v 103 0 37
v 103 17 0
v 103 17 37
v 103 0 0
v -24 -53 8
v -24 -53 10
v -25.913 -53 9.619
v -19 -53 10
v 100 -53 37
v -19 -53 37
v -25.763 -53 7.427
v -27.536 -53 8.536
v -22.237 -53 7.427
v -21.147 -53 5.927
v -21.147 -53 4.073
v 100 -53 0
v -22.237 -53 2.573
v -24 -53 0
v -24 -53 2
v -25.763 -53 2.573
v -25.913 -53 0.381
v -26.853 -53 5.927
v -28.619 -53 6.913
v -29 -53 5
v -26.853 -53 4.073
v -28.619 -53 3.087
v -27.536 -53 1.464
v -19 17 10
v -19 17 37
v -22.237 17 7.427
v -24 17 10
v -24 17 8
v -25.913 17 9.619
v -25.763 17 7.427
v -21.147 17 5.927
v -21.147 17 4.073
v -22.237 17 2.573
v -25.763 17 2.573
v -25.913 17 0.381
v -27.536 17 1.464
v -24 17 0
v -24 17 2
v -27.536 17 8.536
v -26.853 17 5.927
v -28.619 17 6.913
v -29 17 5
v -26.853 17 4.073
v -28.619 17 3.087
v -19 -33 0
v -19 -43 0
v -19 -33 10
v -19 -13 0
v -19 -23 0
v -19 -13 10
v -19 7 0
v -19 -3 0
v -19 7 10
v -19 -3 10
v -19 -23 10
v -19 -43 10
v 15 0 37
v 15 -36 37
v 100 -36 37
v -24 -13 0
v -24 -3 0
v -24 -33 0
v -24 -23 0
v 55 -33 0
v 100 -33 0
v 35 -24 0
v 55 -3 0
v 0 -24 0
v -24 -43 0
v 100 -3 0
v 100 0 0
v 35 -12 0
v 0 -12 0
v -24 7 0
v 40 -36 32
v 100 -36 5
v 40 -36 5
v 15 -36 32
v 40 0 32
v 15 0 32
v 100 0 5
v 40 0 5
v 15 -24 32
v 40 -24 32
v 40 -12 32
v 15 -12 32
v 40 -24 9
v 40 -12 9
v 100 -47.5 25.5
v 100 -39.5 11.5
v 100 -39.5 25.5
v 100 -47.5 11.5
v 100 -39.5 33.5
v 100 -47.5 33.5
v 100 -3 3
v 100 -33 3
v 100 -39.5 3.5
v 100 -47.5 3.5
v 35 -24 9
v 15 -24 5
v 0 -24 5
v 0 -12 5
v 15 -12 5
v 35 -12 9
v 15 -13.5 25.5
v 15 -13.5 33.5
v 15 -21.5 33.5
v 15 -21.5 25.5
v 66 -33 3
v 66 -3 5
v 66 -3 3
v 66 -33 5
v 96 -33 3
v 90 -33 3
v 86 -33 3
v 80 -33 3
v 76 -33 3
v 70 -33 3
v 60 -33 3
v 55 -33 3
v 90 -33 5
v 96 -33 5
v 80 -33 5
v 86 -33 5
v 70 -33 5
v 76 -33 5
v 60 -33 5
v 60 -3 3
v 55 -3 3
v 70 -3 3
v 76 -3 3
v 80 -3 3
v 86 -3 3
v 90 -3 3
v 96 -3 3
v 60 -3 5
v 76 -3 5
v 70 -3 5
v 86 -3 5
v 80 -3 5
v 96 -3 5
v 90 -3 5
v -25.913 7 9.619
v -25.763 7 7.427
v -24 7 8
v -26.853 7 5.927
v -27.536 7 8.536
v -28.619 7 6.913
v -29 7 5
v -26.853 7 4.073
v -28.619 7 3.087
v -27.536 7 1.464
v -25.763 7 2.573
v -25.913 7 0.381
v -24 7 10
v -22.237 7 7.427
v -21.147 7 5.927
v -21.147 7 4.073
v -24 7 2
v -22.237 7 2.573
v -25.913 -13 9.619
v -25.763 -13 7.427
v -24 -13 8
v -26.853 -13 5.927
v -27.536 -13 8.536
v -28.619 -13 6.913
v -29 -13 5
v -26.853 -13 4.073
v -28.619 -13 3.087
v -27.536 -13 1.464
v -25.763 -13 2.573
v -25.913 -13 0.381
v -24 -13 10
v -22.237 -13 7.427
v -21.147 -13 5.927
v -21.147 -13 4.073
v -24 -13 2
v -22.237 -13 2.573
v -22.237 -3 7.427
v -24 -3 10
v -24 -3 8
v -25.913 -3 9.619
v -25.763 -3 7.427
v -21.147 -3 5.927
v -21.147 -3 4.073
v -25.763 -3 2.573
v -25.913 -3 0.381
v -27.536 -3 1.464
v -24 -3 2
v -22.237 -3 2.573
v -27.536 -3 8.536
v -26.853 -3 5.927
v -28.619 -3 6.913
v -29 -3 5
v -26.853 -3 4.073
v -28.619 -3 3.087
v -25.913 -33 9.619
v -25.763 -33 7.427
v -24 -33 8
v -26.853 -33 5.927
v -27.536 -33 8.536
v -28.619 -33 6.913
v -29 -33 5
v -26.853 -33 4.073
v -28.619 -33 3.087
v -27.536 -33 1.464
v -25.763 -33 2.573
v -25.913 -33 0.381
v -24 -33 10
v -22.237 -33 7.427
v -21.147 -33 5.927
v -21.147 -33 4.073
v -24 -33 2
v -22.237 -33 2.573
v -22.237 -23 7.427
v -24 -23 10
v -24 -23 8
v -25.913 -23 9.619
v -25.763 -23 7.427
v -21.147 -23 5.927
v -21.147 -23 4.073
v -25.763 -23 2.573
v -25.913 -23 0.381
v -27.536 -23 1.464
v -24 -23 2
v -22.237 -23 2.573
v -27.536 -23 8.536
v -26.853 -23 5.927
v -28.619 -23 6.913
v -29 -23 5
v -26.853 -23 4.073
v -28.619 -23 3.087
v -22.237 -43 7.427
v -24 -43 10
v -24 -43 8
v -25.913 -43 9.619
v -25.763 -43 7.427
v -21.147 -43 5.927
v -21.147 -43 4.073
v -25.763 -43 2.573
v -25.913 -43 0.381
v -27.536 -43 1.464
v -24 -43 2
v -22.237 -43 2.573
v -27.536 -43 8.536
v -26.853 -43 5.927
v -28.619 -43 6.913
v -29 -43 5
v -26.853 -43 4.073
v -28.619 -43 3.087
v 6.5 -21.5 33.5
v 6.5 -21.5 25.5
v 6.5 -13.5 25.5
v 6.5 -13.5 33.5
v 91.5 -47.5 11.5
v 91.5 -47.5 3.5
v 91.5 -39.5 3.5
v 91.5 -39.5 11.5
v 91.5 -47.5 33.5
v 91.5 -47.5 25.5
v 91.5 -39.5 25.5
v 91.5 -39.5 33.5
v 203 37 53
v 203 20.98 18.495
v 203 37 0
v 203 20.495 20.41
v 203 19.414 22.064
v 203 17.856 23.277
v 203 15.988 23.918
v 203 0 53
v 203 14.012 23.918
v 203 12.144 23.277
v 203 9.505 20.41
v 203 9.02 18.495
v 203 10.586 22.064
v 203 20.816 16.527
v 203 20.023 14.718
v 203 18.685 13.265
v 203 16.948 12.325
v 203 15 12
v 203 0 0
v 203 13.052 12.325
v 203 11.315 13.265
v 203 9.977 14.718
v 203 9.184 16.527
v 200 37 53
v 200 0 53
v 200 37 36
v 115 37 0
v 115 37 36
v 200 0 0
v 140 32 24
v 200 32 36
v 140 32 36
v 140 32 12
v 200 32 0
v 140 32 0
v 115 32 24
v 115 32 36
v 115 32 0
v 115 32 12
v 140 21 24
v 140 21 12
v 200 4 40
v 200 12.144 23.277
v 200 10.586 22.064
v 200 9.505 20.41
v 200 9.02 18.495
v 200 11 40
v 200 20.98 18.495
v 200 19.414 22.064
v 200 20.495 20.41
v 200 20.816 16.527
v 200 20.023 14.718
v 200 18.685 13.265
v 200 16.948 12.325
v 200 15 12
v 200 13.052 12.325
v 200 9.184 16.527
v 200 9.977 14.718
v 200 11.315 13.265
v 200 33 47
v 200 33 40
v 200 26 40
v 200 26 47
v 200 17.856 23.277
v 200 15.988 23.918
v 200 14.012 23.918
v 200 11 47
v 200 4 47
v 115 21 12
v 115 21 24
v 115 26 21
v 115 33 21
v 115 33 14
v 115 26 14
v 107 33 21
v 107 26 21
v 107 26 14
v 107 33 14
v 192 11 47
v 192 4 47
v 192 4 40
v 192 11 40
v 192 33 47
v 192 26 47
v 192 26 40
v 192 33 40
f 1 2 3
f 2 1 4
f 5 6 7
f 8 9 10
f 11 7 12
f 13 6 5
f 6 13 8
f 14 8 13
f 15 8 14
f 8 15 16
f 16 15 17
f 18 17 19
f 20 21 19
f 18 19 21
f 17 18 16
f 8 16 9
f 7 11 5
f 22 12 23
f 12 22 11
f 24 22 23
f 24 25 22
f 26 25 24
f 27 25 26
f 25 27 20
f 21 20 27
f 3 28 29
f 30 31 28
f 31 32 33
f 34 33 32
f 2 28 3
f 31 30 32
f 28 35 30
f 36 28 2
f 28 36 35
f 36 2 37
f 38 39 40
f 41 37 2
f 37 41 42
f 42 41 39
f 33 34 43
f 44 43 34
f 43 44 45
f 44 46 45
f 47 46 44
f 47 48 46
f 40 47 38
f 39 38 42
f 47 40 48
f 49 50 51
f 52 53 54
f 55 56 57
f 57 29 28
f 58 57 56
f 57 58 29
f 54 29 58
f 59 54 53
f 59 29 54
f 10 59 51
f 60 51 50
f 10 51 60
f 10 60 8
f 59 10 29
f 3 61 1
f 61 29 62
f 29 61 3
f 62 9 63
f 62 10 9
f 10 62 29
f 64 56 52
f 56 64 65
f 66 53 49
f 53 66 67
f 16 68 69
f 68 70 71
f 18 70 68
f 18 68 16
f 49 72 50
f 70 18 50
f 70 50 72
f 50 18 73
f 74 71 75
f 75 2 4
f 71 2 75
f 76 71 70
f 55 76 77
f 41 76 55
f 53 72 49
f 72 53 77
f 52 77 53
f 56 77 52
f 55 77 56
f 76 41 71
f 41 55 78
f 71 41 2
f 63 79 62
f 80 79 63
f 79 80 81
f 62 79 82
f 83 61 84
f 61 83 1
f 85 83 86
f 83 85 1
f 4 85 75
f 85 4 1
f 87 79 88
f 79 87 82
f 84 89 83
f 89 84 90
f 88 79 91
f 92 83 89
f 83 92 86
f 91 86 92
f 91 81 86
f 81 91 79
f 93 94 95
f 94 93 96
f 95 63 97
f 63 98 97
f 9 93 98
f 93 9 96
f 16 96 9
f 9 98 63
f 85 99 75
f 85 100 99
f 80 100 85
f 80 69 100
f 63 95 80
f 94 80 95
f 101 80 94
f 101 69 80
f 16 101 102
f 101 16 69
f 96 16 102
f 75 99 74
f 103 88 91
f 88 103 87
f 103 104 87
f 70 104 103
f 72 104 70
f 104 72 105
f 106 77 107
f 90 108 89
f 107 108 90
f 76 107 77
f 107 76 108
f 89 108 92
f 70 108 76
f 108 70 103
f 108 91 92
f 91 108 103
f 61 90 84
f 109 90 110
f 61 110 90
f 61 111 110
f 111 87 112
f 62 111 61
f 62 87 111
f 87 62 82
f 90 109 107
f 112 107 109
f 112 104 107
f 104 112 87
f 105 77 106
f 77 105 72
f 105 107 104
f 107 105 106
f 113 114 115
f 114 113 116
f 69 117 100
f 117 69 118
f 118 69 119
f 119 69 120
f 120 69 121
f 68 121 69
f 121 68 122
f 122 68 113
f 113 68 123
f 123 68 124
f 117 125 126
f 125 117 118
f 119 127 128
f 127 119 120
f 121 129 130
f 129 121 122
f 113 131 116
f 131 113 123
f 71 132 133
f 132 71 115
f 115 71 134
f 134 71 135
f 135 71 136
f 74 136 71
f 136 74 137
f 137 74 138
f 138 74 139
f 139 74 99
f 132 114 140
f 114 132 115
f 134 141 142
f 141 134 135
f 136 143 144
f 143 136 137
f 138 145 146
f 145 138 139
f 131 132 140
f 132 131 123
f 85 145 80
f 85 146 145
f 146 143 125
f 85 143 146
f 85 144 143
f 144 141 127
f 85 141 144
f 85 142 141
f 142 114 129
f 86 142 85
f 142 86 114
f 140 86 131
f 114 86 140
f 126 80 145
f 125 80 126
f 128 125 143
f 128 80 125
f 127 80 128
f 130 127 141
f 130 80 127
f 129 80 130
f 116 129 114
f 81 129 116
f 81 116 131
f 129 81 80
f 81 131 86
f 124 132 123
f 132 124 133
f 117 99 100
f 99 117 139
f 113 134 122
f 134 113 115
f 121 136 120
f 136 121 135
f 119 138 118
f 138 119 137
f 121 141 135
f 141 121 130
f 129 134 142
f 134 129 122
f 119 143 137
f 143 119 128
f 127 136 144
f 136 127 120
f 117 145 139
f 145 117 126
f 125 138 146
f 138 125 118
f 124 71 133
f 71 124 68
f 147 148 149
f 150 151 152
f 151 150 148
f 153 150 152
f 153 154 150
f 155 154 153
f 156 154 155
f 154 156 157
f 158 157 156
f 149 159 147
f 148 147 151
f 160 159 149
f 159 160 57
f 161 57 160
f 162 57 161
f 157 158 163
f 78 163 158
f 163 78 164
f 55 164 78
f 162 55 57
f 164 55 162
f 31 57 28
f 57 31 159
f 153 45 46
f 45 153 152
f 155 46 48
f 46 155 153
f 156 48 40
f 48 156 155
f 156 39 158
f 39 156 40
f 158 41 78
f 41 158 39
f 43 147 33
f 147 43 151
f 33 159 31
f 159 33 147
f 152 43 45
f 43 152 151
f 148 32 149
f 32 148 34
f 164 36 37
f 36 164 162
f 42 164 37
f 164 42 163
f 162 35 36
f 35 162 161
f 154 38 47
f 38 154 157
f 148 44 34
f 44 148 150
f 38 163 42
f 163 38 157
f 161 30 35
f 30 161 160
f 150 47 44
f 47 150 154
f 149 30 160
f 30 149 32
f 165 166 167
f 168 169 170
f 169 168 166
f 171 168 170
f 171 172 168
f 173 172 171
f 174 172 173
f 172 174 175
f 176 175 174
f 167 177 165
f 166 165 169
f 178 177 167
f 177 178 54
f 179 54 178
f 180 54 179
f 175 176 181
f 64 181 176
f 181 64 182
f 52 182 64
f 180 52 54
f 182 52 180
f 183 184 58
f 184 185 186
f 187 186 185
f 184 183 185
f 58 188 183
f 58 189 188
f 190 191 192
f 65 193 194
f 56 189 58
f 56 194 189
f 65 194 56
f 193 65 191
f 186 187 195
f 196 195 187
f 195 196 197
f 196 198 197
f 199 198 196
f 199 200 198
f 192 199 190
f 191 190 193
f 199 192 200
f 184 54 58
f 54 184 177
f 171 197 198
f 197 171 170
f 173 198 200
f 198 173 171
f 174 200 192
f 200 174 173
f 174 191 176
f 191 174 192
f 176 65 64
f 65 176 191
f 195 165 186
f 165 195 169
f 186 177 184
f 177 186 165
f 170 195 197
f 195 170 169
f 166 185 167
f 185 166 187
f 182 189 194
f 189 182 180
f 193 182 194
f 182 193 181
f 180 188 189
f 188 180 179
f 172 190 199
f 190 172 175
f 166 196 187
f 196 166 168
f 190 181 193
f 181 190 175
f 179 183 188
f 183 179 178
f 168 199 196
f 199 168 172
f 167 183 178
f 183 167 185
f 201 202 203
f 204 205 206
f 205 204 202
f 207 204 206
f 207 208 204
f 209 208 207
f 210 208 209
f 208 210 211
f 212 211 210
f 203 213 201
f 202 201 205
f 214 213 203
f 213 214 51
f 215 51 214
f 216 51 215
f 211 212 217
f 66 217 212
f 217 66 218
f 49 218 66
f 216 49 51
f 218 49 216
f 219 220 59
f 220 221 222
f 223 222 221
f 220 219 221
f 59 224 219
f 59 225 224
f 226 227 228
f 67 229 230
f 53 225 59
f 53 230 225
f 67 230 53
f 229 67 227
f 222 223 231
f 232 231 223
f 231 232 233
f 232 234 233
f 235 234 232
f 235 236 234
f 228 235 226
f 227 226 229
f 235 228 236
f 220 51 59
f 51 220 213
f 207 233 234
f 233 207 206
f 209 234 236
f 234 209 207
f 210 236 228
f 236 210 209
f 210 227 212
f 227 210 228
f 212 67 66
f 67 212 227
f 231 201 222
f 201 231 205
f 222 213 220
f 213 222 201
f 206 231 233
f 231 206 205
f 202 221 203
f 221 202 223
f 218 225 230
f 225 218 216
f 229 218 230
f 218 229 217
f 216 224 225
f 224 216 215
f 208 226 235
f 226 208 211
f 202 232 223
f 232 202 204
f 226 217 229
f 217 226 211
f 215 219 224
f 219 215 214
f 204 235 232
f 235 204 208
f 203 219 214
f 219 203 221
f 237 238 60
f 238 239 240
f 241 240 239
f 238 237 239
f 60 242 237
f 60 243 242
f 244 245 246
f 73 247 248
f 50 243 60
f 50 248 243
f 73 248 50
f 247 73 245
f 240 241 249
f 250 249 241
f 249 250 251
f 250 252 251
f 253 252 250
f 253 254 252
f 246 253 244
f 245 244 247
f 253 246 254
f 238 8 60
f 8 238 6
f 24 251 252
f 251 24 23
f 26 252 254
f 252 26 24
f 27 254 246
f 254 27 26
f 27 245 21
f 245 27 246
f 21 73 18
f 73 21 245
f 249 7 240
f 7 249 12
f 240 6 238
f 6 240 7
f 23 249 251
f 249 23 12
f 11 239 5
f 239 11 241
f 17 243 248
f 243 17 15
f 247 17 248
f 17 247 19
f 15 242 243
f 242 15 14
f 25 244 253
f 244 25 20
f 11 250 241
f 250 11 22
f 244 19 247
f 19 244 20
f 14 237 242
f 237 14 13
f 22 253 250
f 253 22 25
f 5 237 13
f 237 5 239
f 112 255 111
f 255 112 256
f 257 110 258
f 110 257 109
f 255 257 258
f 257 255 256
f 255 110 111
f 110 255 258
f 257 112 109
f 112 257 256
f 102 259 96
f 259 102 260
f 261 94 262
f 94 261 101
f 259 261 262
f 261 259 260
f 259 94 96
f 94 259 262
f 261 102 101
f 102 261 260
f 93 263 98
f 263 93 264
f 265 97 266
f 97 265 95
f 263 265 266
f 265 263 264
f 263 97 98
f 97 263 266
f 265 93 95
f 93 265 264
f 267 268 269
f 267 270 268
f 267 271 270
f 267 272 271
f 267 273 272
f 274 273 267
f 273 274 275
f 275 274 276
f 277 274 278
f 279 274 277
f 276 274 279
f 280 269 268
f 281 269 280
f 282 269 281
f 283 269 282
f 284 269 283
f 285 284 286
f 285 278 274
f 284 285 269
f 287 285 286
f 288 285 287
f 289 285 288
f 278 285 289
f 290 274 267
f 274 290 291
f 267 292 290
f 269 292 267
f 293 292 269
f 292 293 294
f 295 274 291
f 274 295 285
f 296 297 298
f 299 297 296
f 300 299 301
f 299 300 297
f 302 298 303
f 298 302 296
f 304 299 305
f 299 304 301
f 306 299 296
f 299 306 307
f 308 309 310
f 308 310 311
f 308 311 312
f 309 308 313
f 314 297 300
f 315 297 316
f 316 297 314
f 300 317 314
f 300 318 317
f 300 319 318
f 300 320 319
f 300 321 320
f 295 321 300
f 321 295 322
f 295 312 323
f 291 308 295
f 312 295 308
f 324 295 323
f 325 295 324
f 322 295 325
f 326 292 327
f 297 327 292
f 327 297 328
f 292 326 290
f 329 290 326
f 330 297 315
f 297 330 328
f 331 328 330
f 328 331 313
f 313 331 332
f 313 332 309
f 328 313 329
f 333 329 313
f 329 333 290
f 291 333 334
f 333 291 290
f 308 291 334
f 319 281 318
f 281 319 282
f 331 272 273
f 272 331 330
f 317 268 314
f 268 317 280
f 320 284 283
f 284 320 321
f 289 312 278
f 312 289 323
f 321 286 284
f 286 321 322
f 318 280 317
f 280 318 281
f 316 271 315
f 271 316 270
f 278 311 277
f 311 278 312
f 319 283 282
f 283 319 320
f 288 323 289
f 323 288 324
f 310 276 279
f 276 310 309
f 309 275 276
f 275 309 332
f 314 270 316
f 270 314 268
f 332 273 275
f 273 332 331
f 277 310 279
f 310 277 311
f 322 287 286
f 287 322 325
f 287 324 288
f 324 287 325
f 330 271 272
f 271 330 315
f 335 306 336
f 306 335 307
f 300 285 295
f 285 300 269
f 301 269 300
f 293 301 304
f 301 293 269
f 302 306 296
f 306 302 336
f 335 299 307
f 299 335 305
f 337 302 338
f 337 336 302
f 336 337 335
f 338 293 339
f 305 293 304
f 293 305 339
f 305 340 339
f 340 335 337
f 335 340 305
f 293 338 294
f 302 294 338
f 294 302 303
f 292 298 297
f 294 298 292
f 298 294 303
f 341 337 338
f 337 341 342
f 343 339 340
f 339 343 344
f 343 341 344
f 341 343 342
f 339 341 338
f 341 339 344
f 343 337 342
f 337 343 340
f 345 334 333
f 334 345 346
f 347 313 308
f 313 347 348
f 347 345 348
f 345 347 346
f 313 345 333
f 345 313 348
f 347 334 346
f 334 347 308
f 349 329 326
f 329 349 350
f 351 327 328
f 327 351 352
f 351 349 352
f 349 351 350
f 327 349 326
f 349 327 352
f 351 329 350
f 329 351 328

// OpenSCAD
//--CUSTOMIZABLE PARAMETER-----           <<< ONLY CUSTOMIZE HERE
//------------------------------
doorLength=125;
doorWidth=37;                           
doorHeight=70;
//------------------------------

//-----CONSTANTS (NOT CUSTOMIXABLE)-------
doorOpeningOffset = 1;
lockLength = 105;
lockBase = 18;
lockHeight = 36;
lockWidth = 32;
latchBaseLength = 40;
latchRad = 5;
latchHoleOffset = 1;
latchHoleRad = latchRad + latchHoleOffset;
latchHoleDia = 2*latchHoleRad;
latchHoleCenter = 10+latchRad;
latchHeight = 2*latchHoleRad;
latchSlotHeight = 2*latchHoleRad;
appendageLength = 15;
thickness = 5;
latchDisplace = 10;
diskCoverLength = 65;
diskCoverWidth = 5;
spinOffset = 3;
teethGap = 5;

//base block of the door
module baseBlock(length, width, height){
    difference(){
        translate([-length+lockLength,0,lockBase-height/2])cube([length-doorOpeningOffset*2,width,height]);
        translate([0,0,0])cube([lockLength,lockWidth,lockHeight]);
    }
    cube([latchBaseLength,lockWidth,lockHeight]);
    translate([100,0,0])cube([thickness-doorOpeningOffset*2,lockWidth,lockHeight]);
     
}

//the real door
module lock_door(length, width, height){
    //latch slot
   difference(){
       baseBlock(length, width, height);
       union(){
           translate([100,latchHoleCenter,latchHeight+latchHoleRad])rotate([0,90,0])cylinder(thickness,d=latchHoleDia,center=false);
           translate([appendageLength+(latchDisplace+latchRad*2),latchHoleCenter-latchHoleRad,latchHeight])cube([10,latchSlotHeight,latchSlotHeight]);
           translate([appendageLength,0,latchHeight])cube([(latchDisplace+latchRad*2),latchHoleCenter+latchHoleRad,latchSlotHeight]);
           translate([0,0,latchHeight])cube([appendageLength,5,latchSlotHeight]);
       }
    }
    //disk slots
    difference(){
        translate([40,0,0])cube([diskCoverLength-doorOpeningOffset*2,diskCoverWidth,lockHeight]);
        union(){
            translate([55,0,spinOffset])cube([100-55,spinOffset,lockHeight-spinOffset*2]);
            for(i = [1:4]){
               translate([50+10*i,spinOffset,spinOffset])cube([teethGap+1,diskCoverWidth-spinOffset,lockHeight-spinOffset*2]); 
            }
            
        }
    }
    //cube to cover door's end    //translate([100,0,18-doorHeight/2])cube([5+doorOpeningOffset*2,5,doorHeight]);
    doorAddhinge(lockLength-length-5,5,lockBase-height/2,height/7,height);
}

//pin used in assembling
module pin(of){
    cube([8+of,7+of,7+of]);
}

//use to seperate a assemble piece
module intersect_cube(of, length, width, height){
    of2 = (of>0)?of/2:0;
    union(){
        translate([100,0,0])cube([5,width,height/2+lockBase]);
        translate([15,latchHoleCenter+latchHoleRad,latchHeight])cube([25,width-(latchHoleCenter+latchHoleRad),latchSlotHeight]);
        translate([15,width-5,0])cube([lockLength-15,5,lockHeight]);
        translate([15-8-of2,22+4-of2,11+3-of2])pin(of);
        translate([100-8-of2,0+4-of2,36+4-of2])pin(of);
        translate([100-8-of2,width-4-7-of2,36+4-of2])pin(of);
    }
    
}

//a piece that can be disassembled to insert latch
module lock_cover(length, width, height){
   intersection(){
    lock_door(length, width, height);
    intersect_cube(0, length, width, height);
   }
   
}

//the remaining door after remove piece
module lock_door_partial(length, width, height){
    difference(){
        lock_door(length, width, height);
        intersect_cube(1, length, width, height);
    }
}

//hinge similar to container's
module doorHinge(x,y,z,hingeHeight){
    translate([x,y,z])
    rotate([0,0,-90])
    difference(){
        union(){
           translate ([-5,0,0])cube([10,5,hingeHeight]); 
           cylinder(hingeHeight,5,5,false);
        }
        cylinder(hingeHeight,3,3,false);
    }
}

//use to add hignes
module doorAddhinge(x,y,z,hingeHeight,totalHeight){
    totalhinge= ceil(doorHeight/(2*hingeHeight));
    for (i = [0:totalhinge-1]){
        z2 = z + i*hingeHeight*2;
        doorHinge(x,y,z2,hingeHeight);
    }
}

//the main module to generate the door
module disassembled_door(doorLength=125, doorWidth=37, doorHeight=70){
    if(doorLength < 125) {doorLength = 125;}
    if(doorWidth < 37) {doorWidth = 37;}
    if(doorHeight < 70) {doorHeight = 70;}
    //reduce door length by offset
    reducedDoorLength = doorLength-doorOpeningOffset;
    
    rotate([90,0,0])lock_door_partial(reducedDoorLength,doorWidth,doorHeight);
    
    translate([100,0,0])lock_cover(reducedDoorLength,doorWidth,doorHeight);
}

disassembled_door(doorLength,doorWidth,doorHeight);
